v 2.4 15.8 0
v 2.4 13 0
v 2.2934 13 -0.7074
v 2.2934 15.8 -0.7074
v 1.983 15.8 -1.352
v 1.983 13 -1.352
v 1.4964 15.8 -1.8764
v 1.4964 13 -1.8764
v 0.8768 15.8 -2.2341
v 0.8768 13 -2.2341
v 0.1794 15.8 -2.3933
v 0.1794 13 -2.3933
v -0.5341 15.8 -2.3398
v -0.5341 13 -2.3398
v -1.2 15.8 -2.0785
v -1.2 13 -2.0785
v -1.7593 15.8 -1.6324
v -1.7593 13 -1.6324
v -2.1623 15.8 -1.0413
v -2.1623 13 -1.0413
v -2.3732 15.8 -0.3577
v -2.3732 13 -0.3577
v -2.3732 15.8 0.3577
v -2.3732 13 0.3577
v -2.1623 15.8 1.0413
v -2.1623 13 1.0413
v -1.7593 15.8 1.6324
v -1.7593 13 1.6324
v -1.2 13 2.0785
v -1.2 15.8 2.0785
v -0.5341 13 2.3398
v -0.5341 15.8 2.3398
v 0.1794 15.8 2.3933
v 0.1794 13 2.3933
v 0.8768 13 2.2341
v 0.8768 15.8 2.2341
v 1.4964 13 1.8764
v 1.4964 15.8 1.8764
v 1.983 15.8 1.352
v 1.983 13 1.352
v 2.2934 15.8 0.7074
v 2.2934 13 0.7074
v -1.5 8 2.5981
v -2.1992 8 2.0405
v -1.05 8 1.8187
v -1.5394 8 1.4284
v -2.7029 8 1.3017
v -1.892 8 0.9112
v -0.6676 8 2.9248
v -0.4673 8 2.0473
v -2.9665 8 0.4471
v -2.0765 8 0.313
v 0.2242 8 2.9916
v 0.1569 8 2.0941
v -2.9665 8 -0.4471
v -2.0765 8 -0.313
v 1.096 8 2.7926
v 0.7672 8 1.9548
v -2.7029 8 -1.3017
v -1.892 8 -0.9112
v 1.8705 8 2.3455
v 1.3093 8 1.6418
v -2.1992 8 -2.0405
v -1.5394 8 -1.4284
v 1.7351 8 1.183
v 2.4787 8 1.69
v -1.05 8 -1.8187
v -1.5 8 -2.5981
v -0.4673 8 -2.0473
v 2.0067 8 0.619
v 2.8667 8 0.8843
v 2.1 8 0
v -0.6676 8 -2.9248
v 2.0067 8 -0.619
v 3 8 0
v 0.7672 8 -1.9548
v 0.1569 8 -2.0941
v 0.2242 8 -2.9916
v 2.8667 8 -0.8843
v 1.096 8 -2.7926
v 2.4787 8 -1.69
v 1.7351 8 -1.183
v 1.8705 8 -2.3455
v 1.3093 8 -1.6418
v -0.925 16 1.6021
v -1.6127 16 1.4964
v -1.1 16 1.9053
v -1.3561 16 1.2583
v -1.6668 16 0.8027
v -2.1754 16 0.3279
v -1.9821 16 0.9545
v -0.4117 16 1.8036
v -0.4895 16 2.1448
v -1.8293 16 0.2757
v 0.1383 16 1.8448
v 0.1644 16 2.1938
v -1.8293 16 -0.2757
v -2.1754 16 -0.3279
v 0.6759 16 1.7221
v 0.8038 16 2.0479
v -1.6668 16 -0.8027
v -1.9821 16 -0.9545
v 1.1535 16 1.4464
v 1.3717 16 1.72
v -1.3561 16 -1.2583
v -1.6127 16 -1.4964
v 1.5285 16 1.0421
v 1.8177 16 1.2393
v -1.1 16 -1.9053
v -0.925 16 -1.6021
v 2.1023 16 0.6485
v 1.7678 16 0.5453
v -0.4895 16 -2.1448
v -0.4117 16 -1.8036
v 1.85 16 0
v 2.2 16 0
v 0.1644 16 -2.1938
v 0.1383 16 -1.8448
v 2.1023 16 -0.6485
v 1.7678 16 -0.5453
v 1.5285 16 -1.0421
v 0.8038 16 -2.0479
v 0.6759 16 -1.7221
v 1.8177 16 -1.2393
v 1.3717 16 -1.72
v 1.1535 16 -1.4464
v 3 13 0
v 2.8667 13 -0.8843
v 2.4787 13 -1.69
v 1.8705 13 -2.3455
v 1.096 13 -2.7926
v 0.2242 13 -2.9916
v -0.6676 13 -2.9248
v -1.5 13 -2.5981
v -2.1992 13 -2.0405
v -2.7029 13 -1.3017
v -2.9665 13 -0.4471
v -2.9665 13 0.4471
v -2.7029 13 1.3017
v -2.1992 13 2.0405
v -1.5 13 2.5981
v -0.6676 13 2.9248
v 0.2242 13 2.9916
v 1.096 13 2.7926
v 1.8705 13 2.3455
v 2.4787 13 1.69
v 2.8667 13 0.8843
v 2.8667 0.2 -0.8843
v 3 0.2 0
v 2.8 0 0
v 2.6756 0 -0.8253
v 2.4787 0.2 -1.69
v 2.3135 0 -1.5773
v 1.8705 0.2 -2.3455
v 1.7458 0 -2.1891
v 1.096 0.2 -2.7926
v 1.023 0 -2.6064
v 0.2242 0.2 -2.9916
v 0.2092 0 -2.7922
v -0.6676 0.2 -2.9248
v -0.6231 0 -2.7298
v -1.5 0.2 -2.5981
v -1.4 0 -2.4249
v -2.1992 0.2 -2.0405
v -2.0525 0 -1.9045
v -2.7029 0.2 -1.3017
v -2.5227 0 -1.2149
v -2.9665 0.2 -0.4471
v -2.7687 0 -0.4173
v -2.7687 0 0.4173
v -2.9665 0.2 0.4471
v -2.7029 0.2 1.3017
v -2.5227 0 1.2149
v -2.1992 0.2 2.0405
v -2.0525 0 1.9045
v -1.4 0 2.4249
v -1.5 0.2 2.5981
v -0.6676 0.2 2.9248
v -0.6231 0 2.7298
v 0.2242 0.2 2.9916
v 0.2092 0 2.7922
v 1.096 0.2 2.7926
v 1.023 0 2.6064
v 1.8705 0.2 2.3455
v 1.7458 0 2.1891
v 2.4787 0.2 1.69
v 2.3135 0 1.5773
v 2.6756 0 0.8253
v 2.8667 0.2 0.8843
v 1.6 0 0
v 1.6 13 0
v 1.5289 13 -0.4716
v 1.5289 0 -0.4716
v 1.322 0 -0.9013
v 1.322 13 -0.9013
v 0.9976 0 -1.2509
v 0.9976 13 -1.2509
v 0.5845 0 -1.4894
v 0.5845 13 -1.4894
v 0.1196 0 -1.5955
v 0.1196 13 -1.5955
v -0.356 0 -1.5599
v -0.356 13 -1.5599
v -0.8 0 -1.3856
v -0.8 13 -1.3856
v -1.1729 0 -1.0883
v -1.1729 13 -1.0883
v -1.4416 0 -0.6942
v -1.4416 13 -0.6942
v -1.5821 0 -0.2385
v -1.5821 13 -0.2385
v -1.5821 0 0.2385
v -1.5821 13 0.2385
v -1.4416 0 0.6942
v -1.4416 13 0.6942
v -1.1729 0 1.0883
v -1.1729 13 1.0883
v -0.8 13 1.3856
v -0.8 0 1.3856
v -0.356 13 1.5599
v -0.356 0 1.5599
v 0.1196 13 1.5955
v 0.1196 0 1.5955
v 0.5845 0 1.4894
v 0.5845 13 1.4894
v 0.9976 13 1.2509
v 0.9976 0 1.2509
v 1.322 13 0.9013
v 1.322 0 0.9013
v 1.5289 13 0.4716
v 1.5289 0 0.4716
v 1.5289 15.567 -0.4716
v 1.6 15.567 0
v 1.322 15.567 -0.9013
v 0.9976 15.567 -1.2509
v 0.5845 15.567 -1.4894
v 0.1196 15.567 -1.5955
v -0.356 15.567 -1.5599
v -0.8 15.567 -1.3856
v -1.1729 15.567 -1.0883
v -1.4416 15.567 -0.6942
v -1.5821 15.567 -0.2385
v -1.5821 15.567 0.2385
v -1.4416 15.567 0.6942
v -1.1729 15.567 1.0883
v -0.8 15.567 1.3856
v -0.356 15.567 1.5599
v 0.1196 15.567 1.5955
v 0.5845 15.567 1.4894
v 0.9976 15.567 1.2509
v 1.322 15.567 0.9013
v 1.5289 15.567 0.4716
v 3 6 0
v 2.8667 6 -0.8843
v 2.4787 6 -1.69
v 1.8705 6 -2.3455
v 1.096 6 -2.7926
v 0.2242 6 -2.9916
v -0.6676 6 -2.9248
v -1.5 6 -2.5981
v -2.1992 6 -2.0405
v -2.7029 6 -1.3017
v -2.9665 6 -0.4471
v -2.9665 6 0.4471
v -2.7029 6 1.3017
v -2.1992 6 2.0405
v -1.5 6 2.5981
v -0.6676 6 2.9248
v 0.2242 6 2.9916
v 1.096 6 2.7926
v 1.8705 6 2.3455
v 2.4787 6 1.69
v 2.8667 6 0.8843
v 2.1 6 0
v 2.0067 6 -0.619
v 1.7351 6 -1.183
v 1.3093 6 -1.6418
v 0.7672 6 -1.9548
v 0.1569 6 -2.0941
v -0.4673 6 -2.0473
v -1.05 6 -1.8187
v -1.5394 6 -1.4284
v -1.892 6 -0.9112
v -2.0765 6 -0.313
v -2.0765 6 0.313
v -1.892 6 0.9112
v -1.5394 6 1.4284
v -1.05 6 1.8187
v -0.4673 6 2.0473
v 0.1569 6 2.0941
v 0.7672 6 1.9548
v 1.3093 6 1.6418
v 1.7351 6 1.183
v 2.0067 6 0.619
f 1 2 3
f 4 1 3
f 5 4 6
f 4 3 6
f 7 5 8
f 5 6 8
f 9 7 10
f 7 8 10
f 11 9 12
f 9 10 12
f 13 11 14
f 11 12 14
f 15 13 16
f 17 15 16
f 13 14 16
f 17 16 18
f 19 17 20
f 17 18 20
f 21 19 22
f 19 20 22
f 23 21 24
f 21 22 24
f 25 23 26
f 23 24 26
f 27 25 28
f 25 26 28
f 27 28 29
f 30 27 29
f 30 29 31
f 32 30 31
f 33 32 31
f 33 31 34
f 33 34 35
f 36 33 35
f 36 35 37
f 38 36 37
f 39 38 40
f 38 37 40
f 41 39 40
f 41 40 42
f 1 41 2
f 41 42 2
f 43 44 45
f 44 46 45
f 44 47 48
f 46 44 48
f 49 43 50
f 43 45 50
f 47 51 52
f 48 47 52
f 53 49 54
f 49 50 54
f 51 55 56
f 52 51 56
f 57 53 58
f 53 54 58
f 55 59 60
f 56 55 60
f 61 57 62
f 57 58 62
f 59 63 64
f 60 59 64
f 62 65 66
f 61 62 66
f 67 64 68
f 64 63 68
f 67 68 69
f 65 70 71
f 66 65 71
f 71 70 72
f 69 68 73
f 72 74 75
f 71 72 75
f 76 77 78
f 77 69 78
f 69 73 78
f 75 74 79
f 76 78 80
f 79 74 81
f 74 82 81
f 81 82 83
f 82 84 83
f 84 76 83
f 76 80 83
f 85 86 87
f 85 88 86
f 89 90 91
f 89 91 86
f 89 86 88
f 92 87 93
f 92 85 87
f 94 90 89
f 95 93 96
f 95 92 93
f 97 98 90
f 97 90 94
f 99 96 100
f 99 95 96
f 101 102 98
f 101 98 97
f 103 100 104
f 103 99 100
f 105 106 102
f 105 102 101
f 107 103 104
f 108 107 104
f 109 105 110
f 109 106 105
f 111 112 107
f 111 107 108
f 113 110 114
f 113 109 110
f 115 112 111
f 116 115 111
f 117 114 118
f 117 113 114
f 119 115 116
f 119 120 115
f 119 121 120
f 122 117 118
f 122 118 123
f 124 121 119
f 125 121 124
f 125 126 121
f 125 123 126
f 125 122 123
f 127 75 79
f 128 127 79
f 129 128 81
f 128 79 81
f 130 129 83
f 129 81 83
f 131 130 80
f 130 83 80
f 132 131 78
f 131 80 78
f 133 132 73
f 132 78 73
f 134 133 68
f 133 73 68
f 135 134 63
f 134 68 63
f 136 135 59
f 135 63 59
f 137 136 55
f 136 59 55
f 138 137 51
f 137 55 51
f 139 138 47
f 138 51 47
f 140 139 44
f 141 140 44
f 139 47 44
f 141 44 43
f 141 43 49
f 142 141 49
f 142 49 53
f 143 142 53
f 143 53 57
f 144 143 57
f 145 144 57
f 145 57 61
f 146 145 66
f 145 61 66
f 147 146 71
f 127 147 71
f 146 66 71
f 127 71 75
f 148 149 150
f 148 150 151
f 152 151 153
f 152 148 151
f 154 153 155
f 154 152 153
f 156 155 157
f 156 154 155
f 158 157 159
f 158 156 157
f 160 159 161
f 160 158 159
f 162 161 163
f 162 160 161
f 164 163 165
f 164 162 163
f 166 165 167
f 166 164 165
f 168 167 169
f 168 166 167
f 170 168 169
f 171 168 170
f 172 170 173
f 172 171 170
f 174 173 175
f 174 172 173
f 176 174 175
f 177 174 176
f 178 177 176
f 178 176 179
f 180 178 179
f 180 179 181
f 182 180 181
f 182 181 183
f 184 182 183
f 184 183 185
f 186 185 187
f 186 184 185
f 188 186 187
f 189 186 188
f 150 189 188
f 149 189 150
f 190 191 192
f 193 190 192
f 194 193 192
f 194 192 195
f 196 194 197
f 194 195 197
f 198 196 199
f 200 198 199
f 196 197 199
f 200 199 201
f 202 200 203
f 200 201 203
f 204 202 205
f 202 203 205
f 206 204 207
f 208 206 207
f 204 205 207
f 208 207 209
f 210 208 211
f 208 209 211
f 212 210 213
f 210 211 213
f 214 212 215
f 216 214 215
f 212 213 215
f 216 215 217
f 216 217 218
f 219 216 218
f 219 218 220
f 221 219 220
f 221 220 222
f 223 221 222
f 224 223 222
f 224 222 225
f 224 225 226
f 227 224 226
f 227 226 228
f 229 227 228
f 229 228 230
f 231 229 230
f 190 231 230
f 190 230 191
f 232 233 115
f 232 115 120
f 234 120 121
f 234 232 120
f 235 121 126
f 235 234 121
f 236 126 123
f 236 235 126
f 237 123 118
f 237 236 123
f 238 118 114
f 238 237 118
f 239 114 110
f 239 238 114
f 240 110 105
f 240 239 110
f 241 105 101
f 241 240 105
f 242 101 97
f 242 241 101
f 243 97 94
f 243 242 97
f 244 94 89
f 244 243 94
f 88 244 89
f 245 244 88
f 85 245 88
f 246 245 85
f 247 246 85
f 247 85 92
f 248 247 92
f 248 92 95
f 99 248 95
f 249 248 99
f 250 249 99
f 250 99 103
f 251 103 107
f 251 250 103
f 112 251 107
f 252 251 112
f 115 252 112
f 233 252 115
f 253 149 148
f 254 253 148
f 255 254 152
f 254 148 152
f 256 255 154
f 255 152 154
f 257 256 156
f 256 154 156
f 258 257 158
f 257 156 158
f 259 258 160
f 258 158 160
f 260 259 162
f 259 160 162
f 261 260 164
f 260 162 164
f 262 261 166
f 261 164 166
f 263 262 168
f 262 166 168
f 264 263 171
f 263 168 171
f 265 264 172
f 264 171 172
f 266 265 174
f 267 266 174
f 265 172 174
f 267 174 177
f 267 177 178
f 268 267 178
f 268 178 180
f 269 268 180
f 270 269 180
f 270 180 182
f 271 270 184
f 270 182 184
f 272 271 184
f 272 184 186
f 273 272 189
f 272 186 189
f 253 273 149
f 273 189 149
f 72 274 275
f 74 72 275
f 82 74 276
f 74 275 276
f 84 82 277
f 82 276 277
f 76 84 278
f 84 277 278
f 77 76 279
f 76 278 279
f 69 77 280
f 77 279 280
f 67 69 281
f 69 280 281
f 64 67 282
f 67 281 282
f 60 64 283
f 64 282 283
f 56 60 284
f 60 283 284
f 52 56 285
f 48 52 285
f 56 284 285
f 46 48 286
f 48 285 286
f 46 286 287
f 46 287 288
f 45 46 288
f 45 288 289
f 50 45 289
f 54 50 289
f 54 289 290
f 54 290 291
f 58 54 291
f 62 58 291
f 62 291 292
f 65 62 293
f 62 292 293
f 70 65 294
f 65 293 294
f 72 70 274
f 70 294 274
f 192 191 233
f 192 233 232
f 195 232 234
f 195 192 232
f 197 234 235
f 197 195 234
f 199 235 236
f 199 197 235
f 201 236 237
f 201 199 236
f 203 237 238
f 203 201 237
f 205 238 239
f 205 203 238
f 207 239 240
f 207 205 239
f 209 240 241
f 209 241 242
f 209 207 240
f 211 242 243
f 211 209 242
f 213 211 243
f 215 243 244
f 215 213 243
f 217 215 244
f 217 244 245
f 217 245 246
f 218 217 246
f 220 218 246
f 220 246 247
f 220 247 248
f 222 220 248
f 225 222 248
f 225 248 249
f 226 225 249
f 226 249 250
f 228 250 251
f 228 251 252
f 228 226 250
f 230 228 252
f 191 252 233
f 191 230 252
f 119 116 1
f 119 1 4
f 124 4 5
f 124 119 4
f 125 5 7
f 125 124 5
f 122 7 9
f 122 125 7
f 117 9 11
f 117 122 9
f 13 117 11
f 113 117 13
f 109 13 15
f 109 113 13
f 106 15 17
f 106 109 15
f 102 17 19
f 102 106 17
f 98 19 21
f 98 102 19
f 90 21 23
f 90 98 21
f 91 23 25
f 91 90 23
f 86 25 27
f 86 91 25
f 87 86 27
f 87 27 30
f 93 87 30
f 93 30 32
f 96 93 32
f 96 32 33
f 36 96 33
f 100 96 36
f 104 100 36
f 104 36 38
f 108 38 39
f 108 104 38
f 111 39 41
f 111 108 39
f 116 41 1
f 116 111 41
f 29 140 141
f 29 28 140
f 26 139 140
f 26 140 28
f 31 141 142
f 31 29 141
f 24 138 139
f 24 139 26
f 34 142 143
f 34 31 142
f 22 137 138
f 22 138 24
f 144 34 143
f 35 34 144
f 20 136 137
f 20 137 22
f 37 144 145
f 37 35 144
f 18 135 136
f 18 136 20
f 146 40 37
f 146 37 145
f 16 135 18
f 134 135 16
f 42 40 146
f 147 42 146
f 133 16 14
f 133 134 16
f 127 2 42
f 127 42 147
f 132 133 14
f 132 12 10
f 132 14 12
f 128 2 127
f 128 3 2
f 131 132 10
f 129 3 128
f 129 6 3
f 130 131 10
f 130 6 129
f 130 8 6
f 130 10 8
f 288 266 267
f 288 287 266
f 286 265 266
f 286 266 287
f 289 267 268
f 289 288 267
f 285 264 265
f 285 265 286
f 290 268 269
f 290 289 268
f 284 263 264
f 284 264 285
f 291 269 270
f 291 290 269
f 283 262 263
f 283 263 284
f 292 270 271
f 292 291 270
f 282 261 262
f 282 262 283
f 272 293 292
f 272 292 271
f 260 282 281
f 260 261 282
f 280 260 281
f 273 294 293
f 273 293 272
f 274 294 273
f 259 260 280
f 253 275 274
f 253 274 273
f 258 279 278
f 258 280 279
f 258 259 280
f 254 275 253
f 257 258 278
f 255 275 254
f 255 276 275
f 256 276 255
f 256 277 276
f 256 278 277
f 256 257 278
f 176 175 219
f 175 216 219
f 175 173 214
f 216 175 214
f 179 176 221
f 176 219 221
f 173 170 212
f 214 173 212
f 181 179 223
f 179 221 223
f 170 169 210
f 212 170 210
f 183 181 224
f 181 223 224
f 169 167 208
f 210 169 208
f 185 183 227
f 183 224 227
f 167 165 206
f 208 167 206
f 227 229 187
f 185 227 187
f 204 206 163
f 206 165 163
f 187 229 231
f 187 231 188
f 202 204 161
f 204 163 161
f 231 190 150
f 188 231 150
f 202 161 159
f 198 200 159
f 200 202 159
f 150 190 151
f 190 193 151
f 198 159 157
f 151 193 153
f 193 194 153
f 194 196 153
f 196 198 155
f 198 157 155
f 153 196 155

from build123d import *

# Parameters (mm, degrees)
SKETCH1_R               = 3
BOSS_EXTRUDE1_DEPTH     = 6
SKETCH2_R               = 2.1
BOSS_EXTRUDE2_DEPTH     = 2
SKETCH3_R               = 3
BOSS_EXTRUDE3_DEPTH     = 5
SKETCH4_R               = 1.6
CUT_EXTRUDE1_DEPTH      = 14
CROQUIS1_R              = 2.4
CROQUIS1_R_2            = 1.6
SALIENTE_EXTRUIR1_DEPTH = 3
CHAFL_N1_SIZE           = 0.2
CHAFL_N2_SIZE           = 0.2
CHAFL_N3_SIZE           = 0.25
CHAFL_N3_SIZE2          = 0.433012702


with BuildPart() as part:
    # Sketch1 → Boss-Extrude1 (new body)
    with BuildSketch(Plane(origin=(0, 0, 0), x_dir=(1, 0, 0), z_dir=(0, 1, 0))):
        Circle(SKETCH1_R)
    extrude(amount=BOSS_EXTRUDE1_DEPTH)

    # Sketch2 → Boss-Extrude2 (add)
    with BuildSketch(Plane(origin=(0, 6, 0), x_dir=(1, 0, 0), z_dir=(0, 1, 0))):
        Circle(SKETCH2_R)
    extrude(amount=BOSS_EXTRUDE2_DEPTH)

    # Sketch3 → Boss-Extrude3 (add)
    with BuildSketch(Plane(origin=(0, 8, 0), x_dir=(1, 0, 0), z_dir=(0, 1, 0))):
        Circle(SKETCH3_R)
    extrude(amount=BOSS_EXTRUDE3_DEPTH)

    # Sketch4 → Cut-Extrude1 (cut, through all)
    with BuildSketch(Plane(origin=(0, 13, 0), x_dir=(1, 0, 0), z_dir=(0, 1, 0))):
        Circle(SKETCH4_R)
    extrude(amount=-CUT_EXTRUDE1_DEPTH, mode=Mode.SUBTRACT)

    # Croquis1 → Saliente-Extruir1 (add)
    with BuildSketch(Plane(origin=(0, 13, 0), x_dir=(1, 0, 0), z_dir=(0, 1, 0))):
        Circle(CROQUIS1_R)
        Circle(CROQUIS1_R_2, mode=Mode.SUBTRACT)
    extrude(amount=SALIENTE_EXTRUIR1_DEPTH)

    # Chaflán1
    chafl_n1_edges = [part.edges().sort_by_distance(p)[0] for p in [
        (-2.4, 16, 0),
    ]]
    chamfer(chafl_n1_edges, length=CHAFL_N1_SIZE)

    # Chaflán2
    chafl_n2_edges = [part.edges().sort_by_distance(p)[0] for p in [
        (-3, 0, 0),
    ]]
    chamfer(chafl_n2_edges, length=CHAFL_N2_SIZE)

    # Chaflán3
    chafl_n3_edges = [part.edges().sort_by_distance(p)[0] for p in [
        (-1.6, 16, 0),
    ]]
    chafl_n3_side = [part.faces().sort_by_distance(p)[0] for p in [
        (-2.137774603, 16, 0),
    ]]
    chamfer(chafl_n3_edges, length=CHAFL_N3_SIZE, length2=CHAFL_N3_SIZE2, reference=chafl_n3_side[0])


solid = part.part
